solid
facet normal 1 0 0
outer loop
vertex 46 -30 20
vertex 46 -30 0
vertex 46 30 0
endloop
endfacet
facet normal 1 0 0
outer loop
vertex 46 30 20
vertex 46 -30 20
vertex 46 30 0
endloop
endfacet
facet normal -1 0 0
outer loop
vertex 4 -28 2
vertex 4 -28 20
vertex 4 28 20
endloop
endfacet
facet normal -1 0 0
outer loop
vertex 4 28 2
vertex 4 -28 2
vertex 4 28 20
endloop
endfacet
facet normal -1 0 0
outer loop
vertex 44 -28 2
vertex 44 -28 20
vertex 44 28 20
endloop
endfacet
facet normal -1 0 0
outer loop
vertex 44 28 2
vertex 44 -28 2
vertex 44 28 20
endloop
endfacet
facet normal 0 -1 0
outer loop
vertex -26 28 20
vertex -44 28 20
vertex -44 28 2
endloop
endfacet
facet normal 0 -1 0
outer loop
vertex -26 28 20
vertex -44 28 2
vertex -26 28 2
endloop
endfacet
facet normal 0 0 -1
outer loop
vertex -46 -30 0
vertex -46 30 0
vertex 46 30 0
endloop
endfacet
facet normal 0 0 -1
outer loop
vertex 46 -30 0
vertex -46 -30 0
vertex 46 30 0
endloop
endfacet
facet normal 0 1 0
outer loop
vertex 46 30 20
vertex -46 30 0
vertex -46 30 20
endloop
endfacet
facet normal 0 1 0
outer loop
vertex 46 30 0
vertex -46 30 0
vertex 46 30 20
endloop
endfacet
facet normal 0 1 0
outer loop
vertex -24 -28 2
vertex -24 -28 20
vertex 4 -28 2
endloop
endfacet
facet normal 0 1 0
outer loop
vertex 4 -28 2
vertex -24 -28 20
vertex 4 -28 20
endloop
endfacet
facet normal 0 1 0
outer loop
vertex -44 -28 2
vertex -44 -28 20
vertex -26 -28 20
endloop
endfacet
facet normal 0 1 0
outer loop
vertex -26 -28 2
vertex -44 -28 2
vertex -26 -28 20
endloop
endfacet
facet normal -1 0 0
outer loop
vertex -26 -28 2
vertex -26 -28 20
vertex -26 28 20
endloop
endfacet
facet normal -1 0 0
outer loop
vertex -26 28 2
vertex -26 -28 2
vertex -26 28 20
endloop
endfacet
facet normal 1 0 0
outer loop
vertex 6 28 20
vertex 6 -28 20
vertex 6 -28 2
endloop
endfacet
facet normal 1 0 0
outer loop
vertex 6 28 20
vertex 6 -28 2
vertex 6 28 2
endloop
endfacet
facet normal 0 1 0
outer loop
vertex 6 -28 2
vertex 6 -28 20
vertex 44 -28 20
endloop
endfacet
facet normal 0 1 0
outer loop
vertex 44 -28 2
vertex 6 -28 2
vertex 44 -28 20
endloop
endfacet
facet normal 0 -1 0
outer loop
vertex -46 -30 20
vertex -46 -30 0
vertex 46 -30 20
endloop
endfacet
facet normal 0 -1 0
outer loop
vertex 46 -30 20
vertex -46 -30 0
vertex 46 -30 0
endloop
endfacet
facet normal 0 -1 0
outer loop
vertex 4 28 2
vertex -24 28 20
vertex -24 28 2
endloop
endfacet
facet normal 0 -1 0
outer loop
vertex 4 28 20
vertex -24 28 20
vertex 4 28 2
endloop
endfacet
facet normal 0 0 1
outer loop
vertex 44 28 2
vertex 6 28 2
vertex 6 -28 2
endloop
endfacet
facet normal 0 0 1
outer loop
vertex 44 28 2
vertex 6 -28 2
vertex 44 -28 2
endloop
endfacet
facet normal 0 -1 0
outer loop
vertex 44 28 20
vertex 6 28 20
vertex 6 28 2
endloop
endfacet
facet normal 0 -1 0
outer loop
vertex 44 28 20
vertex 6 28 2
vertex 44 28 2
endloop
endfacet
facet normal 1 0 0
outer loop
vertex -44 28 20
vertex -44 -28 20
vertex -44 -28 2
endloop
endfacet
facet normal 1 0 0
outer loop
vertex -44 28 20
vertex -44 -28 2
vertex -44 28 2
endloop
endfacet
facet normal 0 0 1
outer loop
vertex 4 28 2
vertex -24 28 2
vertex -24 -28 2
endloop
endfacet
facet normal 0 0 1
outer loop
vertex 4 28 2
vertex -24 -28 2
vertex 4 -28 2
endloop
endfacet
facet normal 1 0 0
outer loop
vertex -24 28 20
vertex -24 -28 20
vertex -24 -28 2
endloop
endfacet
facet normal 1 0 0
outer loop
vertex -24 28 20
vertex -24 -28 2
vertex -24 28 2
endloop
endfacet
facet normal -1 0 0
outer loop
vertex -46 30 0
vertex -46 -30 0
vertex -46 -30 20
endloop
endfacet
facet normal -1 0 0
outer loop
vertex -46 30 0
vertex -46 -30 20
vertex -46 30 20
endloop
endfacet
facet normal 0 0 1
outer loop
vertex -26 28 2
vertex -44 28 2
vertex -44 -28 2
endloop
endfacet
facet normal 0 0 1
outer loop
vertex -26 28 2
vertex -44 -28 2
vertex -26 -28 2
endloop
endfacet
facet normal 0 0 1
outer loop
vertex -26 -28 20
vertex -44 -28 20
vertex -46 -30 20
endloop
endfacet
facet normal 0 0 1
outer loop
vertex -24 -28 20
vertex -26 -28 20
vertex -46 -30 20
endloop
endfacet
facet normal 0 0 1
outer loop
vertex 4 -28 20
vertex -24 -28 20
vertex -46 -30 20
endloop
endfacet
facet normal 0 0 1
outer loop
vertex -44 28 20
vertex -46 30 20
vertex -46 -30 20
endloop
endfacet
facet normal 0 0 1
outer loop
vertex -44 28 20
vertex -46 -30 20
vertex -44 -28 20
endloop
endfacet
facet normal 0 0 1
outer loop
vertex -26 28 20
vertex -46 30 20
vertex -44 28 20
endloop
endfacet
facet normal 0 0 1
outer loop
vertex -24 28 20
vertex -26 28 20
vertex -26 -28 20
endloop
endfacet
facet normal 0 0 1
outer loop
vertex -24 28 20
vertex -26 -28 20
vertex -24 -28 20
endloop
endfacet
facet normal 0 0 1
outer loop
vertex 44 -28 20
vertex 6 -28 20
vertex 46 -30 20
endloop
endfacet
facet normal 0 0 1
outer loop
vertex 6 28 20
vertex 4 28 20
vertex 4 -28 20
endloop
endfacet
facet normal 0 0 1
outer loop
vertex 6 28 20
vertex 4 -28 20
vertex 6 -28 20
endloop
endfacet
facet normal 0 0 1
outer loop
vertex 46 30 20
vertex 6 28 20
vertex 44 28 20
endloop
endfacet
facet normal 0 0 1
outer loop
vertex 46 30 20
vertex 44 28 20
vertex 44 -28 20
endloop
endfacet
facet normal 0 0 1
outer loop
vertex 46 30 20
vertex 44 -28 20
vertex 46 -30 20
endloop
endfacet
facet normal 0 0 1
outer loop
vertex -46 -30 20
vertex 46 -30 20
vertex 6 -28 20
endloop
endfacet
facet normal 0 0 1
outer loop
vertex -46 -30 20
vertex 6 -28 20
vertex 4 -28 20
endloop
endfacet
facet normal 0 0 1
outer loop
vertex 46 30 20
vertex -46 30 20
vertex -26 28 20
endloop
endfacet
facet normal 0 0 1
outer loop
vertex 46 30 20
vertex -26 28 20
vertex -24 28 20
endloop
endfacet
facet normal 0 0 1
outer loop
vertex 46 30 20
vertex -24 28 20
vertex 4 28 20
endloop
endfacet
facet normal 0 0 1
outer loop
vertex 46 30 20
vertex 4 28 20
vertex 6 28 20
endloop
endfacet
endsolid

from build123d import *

# Parameters (mm, degrees)
F0_W     = 92
F0_H     = 60
F1_DEPTH = 20
F2_W     = 18
F2_H     = 56
F2_W_2   = 28
F2_W_3   = 38
F3_DEPTH = 18


with BuildPart() as f1:
    # F0 (on Top) → F1 (new body)
    with BuildSketch(Plane.XY):
        Rectangle(F0_W, F0_H)
    extrude(amount=F1_DEPTH)

    # F2 (on face) → F3 (cut)
    with BuildSketch(Plane.XY.offset(20)):
        with Locations((-35, 0)):
            Rectangle(F2_W, F2_H)
        with Locations((-10, 0)):
            Rectangle(F2_W_2, F2_H)
        with Locations((25, 0)):
            Rectangle(F2_W_3, F2_H)
    extrude(amount=-F3_DEPTH, mode=Mode.SUBTRACT)


solid = f1.part
